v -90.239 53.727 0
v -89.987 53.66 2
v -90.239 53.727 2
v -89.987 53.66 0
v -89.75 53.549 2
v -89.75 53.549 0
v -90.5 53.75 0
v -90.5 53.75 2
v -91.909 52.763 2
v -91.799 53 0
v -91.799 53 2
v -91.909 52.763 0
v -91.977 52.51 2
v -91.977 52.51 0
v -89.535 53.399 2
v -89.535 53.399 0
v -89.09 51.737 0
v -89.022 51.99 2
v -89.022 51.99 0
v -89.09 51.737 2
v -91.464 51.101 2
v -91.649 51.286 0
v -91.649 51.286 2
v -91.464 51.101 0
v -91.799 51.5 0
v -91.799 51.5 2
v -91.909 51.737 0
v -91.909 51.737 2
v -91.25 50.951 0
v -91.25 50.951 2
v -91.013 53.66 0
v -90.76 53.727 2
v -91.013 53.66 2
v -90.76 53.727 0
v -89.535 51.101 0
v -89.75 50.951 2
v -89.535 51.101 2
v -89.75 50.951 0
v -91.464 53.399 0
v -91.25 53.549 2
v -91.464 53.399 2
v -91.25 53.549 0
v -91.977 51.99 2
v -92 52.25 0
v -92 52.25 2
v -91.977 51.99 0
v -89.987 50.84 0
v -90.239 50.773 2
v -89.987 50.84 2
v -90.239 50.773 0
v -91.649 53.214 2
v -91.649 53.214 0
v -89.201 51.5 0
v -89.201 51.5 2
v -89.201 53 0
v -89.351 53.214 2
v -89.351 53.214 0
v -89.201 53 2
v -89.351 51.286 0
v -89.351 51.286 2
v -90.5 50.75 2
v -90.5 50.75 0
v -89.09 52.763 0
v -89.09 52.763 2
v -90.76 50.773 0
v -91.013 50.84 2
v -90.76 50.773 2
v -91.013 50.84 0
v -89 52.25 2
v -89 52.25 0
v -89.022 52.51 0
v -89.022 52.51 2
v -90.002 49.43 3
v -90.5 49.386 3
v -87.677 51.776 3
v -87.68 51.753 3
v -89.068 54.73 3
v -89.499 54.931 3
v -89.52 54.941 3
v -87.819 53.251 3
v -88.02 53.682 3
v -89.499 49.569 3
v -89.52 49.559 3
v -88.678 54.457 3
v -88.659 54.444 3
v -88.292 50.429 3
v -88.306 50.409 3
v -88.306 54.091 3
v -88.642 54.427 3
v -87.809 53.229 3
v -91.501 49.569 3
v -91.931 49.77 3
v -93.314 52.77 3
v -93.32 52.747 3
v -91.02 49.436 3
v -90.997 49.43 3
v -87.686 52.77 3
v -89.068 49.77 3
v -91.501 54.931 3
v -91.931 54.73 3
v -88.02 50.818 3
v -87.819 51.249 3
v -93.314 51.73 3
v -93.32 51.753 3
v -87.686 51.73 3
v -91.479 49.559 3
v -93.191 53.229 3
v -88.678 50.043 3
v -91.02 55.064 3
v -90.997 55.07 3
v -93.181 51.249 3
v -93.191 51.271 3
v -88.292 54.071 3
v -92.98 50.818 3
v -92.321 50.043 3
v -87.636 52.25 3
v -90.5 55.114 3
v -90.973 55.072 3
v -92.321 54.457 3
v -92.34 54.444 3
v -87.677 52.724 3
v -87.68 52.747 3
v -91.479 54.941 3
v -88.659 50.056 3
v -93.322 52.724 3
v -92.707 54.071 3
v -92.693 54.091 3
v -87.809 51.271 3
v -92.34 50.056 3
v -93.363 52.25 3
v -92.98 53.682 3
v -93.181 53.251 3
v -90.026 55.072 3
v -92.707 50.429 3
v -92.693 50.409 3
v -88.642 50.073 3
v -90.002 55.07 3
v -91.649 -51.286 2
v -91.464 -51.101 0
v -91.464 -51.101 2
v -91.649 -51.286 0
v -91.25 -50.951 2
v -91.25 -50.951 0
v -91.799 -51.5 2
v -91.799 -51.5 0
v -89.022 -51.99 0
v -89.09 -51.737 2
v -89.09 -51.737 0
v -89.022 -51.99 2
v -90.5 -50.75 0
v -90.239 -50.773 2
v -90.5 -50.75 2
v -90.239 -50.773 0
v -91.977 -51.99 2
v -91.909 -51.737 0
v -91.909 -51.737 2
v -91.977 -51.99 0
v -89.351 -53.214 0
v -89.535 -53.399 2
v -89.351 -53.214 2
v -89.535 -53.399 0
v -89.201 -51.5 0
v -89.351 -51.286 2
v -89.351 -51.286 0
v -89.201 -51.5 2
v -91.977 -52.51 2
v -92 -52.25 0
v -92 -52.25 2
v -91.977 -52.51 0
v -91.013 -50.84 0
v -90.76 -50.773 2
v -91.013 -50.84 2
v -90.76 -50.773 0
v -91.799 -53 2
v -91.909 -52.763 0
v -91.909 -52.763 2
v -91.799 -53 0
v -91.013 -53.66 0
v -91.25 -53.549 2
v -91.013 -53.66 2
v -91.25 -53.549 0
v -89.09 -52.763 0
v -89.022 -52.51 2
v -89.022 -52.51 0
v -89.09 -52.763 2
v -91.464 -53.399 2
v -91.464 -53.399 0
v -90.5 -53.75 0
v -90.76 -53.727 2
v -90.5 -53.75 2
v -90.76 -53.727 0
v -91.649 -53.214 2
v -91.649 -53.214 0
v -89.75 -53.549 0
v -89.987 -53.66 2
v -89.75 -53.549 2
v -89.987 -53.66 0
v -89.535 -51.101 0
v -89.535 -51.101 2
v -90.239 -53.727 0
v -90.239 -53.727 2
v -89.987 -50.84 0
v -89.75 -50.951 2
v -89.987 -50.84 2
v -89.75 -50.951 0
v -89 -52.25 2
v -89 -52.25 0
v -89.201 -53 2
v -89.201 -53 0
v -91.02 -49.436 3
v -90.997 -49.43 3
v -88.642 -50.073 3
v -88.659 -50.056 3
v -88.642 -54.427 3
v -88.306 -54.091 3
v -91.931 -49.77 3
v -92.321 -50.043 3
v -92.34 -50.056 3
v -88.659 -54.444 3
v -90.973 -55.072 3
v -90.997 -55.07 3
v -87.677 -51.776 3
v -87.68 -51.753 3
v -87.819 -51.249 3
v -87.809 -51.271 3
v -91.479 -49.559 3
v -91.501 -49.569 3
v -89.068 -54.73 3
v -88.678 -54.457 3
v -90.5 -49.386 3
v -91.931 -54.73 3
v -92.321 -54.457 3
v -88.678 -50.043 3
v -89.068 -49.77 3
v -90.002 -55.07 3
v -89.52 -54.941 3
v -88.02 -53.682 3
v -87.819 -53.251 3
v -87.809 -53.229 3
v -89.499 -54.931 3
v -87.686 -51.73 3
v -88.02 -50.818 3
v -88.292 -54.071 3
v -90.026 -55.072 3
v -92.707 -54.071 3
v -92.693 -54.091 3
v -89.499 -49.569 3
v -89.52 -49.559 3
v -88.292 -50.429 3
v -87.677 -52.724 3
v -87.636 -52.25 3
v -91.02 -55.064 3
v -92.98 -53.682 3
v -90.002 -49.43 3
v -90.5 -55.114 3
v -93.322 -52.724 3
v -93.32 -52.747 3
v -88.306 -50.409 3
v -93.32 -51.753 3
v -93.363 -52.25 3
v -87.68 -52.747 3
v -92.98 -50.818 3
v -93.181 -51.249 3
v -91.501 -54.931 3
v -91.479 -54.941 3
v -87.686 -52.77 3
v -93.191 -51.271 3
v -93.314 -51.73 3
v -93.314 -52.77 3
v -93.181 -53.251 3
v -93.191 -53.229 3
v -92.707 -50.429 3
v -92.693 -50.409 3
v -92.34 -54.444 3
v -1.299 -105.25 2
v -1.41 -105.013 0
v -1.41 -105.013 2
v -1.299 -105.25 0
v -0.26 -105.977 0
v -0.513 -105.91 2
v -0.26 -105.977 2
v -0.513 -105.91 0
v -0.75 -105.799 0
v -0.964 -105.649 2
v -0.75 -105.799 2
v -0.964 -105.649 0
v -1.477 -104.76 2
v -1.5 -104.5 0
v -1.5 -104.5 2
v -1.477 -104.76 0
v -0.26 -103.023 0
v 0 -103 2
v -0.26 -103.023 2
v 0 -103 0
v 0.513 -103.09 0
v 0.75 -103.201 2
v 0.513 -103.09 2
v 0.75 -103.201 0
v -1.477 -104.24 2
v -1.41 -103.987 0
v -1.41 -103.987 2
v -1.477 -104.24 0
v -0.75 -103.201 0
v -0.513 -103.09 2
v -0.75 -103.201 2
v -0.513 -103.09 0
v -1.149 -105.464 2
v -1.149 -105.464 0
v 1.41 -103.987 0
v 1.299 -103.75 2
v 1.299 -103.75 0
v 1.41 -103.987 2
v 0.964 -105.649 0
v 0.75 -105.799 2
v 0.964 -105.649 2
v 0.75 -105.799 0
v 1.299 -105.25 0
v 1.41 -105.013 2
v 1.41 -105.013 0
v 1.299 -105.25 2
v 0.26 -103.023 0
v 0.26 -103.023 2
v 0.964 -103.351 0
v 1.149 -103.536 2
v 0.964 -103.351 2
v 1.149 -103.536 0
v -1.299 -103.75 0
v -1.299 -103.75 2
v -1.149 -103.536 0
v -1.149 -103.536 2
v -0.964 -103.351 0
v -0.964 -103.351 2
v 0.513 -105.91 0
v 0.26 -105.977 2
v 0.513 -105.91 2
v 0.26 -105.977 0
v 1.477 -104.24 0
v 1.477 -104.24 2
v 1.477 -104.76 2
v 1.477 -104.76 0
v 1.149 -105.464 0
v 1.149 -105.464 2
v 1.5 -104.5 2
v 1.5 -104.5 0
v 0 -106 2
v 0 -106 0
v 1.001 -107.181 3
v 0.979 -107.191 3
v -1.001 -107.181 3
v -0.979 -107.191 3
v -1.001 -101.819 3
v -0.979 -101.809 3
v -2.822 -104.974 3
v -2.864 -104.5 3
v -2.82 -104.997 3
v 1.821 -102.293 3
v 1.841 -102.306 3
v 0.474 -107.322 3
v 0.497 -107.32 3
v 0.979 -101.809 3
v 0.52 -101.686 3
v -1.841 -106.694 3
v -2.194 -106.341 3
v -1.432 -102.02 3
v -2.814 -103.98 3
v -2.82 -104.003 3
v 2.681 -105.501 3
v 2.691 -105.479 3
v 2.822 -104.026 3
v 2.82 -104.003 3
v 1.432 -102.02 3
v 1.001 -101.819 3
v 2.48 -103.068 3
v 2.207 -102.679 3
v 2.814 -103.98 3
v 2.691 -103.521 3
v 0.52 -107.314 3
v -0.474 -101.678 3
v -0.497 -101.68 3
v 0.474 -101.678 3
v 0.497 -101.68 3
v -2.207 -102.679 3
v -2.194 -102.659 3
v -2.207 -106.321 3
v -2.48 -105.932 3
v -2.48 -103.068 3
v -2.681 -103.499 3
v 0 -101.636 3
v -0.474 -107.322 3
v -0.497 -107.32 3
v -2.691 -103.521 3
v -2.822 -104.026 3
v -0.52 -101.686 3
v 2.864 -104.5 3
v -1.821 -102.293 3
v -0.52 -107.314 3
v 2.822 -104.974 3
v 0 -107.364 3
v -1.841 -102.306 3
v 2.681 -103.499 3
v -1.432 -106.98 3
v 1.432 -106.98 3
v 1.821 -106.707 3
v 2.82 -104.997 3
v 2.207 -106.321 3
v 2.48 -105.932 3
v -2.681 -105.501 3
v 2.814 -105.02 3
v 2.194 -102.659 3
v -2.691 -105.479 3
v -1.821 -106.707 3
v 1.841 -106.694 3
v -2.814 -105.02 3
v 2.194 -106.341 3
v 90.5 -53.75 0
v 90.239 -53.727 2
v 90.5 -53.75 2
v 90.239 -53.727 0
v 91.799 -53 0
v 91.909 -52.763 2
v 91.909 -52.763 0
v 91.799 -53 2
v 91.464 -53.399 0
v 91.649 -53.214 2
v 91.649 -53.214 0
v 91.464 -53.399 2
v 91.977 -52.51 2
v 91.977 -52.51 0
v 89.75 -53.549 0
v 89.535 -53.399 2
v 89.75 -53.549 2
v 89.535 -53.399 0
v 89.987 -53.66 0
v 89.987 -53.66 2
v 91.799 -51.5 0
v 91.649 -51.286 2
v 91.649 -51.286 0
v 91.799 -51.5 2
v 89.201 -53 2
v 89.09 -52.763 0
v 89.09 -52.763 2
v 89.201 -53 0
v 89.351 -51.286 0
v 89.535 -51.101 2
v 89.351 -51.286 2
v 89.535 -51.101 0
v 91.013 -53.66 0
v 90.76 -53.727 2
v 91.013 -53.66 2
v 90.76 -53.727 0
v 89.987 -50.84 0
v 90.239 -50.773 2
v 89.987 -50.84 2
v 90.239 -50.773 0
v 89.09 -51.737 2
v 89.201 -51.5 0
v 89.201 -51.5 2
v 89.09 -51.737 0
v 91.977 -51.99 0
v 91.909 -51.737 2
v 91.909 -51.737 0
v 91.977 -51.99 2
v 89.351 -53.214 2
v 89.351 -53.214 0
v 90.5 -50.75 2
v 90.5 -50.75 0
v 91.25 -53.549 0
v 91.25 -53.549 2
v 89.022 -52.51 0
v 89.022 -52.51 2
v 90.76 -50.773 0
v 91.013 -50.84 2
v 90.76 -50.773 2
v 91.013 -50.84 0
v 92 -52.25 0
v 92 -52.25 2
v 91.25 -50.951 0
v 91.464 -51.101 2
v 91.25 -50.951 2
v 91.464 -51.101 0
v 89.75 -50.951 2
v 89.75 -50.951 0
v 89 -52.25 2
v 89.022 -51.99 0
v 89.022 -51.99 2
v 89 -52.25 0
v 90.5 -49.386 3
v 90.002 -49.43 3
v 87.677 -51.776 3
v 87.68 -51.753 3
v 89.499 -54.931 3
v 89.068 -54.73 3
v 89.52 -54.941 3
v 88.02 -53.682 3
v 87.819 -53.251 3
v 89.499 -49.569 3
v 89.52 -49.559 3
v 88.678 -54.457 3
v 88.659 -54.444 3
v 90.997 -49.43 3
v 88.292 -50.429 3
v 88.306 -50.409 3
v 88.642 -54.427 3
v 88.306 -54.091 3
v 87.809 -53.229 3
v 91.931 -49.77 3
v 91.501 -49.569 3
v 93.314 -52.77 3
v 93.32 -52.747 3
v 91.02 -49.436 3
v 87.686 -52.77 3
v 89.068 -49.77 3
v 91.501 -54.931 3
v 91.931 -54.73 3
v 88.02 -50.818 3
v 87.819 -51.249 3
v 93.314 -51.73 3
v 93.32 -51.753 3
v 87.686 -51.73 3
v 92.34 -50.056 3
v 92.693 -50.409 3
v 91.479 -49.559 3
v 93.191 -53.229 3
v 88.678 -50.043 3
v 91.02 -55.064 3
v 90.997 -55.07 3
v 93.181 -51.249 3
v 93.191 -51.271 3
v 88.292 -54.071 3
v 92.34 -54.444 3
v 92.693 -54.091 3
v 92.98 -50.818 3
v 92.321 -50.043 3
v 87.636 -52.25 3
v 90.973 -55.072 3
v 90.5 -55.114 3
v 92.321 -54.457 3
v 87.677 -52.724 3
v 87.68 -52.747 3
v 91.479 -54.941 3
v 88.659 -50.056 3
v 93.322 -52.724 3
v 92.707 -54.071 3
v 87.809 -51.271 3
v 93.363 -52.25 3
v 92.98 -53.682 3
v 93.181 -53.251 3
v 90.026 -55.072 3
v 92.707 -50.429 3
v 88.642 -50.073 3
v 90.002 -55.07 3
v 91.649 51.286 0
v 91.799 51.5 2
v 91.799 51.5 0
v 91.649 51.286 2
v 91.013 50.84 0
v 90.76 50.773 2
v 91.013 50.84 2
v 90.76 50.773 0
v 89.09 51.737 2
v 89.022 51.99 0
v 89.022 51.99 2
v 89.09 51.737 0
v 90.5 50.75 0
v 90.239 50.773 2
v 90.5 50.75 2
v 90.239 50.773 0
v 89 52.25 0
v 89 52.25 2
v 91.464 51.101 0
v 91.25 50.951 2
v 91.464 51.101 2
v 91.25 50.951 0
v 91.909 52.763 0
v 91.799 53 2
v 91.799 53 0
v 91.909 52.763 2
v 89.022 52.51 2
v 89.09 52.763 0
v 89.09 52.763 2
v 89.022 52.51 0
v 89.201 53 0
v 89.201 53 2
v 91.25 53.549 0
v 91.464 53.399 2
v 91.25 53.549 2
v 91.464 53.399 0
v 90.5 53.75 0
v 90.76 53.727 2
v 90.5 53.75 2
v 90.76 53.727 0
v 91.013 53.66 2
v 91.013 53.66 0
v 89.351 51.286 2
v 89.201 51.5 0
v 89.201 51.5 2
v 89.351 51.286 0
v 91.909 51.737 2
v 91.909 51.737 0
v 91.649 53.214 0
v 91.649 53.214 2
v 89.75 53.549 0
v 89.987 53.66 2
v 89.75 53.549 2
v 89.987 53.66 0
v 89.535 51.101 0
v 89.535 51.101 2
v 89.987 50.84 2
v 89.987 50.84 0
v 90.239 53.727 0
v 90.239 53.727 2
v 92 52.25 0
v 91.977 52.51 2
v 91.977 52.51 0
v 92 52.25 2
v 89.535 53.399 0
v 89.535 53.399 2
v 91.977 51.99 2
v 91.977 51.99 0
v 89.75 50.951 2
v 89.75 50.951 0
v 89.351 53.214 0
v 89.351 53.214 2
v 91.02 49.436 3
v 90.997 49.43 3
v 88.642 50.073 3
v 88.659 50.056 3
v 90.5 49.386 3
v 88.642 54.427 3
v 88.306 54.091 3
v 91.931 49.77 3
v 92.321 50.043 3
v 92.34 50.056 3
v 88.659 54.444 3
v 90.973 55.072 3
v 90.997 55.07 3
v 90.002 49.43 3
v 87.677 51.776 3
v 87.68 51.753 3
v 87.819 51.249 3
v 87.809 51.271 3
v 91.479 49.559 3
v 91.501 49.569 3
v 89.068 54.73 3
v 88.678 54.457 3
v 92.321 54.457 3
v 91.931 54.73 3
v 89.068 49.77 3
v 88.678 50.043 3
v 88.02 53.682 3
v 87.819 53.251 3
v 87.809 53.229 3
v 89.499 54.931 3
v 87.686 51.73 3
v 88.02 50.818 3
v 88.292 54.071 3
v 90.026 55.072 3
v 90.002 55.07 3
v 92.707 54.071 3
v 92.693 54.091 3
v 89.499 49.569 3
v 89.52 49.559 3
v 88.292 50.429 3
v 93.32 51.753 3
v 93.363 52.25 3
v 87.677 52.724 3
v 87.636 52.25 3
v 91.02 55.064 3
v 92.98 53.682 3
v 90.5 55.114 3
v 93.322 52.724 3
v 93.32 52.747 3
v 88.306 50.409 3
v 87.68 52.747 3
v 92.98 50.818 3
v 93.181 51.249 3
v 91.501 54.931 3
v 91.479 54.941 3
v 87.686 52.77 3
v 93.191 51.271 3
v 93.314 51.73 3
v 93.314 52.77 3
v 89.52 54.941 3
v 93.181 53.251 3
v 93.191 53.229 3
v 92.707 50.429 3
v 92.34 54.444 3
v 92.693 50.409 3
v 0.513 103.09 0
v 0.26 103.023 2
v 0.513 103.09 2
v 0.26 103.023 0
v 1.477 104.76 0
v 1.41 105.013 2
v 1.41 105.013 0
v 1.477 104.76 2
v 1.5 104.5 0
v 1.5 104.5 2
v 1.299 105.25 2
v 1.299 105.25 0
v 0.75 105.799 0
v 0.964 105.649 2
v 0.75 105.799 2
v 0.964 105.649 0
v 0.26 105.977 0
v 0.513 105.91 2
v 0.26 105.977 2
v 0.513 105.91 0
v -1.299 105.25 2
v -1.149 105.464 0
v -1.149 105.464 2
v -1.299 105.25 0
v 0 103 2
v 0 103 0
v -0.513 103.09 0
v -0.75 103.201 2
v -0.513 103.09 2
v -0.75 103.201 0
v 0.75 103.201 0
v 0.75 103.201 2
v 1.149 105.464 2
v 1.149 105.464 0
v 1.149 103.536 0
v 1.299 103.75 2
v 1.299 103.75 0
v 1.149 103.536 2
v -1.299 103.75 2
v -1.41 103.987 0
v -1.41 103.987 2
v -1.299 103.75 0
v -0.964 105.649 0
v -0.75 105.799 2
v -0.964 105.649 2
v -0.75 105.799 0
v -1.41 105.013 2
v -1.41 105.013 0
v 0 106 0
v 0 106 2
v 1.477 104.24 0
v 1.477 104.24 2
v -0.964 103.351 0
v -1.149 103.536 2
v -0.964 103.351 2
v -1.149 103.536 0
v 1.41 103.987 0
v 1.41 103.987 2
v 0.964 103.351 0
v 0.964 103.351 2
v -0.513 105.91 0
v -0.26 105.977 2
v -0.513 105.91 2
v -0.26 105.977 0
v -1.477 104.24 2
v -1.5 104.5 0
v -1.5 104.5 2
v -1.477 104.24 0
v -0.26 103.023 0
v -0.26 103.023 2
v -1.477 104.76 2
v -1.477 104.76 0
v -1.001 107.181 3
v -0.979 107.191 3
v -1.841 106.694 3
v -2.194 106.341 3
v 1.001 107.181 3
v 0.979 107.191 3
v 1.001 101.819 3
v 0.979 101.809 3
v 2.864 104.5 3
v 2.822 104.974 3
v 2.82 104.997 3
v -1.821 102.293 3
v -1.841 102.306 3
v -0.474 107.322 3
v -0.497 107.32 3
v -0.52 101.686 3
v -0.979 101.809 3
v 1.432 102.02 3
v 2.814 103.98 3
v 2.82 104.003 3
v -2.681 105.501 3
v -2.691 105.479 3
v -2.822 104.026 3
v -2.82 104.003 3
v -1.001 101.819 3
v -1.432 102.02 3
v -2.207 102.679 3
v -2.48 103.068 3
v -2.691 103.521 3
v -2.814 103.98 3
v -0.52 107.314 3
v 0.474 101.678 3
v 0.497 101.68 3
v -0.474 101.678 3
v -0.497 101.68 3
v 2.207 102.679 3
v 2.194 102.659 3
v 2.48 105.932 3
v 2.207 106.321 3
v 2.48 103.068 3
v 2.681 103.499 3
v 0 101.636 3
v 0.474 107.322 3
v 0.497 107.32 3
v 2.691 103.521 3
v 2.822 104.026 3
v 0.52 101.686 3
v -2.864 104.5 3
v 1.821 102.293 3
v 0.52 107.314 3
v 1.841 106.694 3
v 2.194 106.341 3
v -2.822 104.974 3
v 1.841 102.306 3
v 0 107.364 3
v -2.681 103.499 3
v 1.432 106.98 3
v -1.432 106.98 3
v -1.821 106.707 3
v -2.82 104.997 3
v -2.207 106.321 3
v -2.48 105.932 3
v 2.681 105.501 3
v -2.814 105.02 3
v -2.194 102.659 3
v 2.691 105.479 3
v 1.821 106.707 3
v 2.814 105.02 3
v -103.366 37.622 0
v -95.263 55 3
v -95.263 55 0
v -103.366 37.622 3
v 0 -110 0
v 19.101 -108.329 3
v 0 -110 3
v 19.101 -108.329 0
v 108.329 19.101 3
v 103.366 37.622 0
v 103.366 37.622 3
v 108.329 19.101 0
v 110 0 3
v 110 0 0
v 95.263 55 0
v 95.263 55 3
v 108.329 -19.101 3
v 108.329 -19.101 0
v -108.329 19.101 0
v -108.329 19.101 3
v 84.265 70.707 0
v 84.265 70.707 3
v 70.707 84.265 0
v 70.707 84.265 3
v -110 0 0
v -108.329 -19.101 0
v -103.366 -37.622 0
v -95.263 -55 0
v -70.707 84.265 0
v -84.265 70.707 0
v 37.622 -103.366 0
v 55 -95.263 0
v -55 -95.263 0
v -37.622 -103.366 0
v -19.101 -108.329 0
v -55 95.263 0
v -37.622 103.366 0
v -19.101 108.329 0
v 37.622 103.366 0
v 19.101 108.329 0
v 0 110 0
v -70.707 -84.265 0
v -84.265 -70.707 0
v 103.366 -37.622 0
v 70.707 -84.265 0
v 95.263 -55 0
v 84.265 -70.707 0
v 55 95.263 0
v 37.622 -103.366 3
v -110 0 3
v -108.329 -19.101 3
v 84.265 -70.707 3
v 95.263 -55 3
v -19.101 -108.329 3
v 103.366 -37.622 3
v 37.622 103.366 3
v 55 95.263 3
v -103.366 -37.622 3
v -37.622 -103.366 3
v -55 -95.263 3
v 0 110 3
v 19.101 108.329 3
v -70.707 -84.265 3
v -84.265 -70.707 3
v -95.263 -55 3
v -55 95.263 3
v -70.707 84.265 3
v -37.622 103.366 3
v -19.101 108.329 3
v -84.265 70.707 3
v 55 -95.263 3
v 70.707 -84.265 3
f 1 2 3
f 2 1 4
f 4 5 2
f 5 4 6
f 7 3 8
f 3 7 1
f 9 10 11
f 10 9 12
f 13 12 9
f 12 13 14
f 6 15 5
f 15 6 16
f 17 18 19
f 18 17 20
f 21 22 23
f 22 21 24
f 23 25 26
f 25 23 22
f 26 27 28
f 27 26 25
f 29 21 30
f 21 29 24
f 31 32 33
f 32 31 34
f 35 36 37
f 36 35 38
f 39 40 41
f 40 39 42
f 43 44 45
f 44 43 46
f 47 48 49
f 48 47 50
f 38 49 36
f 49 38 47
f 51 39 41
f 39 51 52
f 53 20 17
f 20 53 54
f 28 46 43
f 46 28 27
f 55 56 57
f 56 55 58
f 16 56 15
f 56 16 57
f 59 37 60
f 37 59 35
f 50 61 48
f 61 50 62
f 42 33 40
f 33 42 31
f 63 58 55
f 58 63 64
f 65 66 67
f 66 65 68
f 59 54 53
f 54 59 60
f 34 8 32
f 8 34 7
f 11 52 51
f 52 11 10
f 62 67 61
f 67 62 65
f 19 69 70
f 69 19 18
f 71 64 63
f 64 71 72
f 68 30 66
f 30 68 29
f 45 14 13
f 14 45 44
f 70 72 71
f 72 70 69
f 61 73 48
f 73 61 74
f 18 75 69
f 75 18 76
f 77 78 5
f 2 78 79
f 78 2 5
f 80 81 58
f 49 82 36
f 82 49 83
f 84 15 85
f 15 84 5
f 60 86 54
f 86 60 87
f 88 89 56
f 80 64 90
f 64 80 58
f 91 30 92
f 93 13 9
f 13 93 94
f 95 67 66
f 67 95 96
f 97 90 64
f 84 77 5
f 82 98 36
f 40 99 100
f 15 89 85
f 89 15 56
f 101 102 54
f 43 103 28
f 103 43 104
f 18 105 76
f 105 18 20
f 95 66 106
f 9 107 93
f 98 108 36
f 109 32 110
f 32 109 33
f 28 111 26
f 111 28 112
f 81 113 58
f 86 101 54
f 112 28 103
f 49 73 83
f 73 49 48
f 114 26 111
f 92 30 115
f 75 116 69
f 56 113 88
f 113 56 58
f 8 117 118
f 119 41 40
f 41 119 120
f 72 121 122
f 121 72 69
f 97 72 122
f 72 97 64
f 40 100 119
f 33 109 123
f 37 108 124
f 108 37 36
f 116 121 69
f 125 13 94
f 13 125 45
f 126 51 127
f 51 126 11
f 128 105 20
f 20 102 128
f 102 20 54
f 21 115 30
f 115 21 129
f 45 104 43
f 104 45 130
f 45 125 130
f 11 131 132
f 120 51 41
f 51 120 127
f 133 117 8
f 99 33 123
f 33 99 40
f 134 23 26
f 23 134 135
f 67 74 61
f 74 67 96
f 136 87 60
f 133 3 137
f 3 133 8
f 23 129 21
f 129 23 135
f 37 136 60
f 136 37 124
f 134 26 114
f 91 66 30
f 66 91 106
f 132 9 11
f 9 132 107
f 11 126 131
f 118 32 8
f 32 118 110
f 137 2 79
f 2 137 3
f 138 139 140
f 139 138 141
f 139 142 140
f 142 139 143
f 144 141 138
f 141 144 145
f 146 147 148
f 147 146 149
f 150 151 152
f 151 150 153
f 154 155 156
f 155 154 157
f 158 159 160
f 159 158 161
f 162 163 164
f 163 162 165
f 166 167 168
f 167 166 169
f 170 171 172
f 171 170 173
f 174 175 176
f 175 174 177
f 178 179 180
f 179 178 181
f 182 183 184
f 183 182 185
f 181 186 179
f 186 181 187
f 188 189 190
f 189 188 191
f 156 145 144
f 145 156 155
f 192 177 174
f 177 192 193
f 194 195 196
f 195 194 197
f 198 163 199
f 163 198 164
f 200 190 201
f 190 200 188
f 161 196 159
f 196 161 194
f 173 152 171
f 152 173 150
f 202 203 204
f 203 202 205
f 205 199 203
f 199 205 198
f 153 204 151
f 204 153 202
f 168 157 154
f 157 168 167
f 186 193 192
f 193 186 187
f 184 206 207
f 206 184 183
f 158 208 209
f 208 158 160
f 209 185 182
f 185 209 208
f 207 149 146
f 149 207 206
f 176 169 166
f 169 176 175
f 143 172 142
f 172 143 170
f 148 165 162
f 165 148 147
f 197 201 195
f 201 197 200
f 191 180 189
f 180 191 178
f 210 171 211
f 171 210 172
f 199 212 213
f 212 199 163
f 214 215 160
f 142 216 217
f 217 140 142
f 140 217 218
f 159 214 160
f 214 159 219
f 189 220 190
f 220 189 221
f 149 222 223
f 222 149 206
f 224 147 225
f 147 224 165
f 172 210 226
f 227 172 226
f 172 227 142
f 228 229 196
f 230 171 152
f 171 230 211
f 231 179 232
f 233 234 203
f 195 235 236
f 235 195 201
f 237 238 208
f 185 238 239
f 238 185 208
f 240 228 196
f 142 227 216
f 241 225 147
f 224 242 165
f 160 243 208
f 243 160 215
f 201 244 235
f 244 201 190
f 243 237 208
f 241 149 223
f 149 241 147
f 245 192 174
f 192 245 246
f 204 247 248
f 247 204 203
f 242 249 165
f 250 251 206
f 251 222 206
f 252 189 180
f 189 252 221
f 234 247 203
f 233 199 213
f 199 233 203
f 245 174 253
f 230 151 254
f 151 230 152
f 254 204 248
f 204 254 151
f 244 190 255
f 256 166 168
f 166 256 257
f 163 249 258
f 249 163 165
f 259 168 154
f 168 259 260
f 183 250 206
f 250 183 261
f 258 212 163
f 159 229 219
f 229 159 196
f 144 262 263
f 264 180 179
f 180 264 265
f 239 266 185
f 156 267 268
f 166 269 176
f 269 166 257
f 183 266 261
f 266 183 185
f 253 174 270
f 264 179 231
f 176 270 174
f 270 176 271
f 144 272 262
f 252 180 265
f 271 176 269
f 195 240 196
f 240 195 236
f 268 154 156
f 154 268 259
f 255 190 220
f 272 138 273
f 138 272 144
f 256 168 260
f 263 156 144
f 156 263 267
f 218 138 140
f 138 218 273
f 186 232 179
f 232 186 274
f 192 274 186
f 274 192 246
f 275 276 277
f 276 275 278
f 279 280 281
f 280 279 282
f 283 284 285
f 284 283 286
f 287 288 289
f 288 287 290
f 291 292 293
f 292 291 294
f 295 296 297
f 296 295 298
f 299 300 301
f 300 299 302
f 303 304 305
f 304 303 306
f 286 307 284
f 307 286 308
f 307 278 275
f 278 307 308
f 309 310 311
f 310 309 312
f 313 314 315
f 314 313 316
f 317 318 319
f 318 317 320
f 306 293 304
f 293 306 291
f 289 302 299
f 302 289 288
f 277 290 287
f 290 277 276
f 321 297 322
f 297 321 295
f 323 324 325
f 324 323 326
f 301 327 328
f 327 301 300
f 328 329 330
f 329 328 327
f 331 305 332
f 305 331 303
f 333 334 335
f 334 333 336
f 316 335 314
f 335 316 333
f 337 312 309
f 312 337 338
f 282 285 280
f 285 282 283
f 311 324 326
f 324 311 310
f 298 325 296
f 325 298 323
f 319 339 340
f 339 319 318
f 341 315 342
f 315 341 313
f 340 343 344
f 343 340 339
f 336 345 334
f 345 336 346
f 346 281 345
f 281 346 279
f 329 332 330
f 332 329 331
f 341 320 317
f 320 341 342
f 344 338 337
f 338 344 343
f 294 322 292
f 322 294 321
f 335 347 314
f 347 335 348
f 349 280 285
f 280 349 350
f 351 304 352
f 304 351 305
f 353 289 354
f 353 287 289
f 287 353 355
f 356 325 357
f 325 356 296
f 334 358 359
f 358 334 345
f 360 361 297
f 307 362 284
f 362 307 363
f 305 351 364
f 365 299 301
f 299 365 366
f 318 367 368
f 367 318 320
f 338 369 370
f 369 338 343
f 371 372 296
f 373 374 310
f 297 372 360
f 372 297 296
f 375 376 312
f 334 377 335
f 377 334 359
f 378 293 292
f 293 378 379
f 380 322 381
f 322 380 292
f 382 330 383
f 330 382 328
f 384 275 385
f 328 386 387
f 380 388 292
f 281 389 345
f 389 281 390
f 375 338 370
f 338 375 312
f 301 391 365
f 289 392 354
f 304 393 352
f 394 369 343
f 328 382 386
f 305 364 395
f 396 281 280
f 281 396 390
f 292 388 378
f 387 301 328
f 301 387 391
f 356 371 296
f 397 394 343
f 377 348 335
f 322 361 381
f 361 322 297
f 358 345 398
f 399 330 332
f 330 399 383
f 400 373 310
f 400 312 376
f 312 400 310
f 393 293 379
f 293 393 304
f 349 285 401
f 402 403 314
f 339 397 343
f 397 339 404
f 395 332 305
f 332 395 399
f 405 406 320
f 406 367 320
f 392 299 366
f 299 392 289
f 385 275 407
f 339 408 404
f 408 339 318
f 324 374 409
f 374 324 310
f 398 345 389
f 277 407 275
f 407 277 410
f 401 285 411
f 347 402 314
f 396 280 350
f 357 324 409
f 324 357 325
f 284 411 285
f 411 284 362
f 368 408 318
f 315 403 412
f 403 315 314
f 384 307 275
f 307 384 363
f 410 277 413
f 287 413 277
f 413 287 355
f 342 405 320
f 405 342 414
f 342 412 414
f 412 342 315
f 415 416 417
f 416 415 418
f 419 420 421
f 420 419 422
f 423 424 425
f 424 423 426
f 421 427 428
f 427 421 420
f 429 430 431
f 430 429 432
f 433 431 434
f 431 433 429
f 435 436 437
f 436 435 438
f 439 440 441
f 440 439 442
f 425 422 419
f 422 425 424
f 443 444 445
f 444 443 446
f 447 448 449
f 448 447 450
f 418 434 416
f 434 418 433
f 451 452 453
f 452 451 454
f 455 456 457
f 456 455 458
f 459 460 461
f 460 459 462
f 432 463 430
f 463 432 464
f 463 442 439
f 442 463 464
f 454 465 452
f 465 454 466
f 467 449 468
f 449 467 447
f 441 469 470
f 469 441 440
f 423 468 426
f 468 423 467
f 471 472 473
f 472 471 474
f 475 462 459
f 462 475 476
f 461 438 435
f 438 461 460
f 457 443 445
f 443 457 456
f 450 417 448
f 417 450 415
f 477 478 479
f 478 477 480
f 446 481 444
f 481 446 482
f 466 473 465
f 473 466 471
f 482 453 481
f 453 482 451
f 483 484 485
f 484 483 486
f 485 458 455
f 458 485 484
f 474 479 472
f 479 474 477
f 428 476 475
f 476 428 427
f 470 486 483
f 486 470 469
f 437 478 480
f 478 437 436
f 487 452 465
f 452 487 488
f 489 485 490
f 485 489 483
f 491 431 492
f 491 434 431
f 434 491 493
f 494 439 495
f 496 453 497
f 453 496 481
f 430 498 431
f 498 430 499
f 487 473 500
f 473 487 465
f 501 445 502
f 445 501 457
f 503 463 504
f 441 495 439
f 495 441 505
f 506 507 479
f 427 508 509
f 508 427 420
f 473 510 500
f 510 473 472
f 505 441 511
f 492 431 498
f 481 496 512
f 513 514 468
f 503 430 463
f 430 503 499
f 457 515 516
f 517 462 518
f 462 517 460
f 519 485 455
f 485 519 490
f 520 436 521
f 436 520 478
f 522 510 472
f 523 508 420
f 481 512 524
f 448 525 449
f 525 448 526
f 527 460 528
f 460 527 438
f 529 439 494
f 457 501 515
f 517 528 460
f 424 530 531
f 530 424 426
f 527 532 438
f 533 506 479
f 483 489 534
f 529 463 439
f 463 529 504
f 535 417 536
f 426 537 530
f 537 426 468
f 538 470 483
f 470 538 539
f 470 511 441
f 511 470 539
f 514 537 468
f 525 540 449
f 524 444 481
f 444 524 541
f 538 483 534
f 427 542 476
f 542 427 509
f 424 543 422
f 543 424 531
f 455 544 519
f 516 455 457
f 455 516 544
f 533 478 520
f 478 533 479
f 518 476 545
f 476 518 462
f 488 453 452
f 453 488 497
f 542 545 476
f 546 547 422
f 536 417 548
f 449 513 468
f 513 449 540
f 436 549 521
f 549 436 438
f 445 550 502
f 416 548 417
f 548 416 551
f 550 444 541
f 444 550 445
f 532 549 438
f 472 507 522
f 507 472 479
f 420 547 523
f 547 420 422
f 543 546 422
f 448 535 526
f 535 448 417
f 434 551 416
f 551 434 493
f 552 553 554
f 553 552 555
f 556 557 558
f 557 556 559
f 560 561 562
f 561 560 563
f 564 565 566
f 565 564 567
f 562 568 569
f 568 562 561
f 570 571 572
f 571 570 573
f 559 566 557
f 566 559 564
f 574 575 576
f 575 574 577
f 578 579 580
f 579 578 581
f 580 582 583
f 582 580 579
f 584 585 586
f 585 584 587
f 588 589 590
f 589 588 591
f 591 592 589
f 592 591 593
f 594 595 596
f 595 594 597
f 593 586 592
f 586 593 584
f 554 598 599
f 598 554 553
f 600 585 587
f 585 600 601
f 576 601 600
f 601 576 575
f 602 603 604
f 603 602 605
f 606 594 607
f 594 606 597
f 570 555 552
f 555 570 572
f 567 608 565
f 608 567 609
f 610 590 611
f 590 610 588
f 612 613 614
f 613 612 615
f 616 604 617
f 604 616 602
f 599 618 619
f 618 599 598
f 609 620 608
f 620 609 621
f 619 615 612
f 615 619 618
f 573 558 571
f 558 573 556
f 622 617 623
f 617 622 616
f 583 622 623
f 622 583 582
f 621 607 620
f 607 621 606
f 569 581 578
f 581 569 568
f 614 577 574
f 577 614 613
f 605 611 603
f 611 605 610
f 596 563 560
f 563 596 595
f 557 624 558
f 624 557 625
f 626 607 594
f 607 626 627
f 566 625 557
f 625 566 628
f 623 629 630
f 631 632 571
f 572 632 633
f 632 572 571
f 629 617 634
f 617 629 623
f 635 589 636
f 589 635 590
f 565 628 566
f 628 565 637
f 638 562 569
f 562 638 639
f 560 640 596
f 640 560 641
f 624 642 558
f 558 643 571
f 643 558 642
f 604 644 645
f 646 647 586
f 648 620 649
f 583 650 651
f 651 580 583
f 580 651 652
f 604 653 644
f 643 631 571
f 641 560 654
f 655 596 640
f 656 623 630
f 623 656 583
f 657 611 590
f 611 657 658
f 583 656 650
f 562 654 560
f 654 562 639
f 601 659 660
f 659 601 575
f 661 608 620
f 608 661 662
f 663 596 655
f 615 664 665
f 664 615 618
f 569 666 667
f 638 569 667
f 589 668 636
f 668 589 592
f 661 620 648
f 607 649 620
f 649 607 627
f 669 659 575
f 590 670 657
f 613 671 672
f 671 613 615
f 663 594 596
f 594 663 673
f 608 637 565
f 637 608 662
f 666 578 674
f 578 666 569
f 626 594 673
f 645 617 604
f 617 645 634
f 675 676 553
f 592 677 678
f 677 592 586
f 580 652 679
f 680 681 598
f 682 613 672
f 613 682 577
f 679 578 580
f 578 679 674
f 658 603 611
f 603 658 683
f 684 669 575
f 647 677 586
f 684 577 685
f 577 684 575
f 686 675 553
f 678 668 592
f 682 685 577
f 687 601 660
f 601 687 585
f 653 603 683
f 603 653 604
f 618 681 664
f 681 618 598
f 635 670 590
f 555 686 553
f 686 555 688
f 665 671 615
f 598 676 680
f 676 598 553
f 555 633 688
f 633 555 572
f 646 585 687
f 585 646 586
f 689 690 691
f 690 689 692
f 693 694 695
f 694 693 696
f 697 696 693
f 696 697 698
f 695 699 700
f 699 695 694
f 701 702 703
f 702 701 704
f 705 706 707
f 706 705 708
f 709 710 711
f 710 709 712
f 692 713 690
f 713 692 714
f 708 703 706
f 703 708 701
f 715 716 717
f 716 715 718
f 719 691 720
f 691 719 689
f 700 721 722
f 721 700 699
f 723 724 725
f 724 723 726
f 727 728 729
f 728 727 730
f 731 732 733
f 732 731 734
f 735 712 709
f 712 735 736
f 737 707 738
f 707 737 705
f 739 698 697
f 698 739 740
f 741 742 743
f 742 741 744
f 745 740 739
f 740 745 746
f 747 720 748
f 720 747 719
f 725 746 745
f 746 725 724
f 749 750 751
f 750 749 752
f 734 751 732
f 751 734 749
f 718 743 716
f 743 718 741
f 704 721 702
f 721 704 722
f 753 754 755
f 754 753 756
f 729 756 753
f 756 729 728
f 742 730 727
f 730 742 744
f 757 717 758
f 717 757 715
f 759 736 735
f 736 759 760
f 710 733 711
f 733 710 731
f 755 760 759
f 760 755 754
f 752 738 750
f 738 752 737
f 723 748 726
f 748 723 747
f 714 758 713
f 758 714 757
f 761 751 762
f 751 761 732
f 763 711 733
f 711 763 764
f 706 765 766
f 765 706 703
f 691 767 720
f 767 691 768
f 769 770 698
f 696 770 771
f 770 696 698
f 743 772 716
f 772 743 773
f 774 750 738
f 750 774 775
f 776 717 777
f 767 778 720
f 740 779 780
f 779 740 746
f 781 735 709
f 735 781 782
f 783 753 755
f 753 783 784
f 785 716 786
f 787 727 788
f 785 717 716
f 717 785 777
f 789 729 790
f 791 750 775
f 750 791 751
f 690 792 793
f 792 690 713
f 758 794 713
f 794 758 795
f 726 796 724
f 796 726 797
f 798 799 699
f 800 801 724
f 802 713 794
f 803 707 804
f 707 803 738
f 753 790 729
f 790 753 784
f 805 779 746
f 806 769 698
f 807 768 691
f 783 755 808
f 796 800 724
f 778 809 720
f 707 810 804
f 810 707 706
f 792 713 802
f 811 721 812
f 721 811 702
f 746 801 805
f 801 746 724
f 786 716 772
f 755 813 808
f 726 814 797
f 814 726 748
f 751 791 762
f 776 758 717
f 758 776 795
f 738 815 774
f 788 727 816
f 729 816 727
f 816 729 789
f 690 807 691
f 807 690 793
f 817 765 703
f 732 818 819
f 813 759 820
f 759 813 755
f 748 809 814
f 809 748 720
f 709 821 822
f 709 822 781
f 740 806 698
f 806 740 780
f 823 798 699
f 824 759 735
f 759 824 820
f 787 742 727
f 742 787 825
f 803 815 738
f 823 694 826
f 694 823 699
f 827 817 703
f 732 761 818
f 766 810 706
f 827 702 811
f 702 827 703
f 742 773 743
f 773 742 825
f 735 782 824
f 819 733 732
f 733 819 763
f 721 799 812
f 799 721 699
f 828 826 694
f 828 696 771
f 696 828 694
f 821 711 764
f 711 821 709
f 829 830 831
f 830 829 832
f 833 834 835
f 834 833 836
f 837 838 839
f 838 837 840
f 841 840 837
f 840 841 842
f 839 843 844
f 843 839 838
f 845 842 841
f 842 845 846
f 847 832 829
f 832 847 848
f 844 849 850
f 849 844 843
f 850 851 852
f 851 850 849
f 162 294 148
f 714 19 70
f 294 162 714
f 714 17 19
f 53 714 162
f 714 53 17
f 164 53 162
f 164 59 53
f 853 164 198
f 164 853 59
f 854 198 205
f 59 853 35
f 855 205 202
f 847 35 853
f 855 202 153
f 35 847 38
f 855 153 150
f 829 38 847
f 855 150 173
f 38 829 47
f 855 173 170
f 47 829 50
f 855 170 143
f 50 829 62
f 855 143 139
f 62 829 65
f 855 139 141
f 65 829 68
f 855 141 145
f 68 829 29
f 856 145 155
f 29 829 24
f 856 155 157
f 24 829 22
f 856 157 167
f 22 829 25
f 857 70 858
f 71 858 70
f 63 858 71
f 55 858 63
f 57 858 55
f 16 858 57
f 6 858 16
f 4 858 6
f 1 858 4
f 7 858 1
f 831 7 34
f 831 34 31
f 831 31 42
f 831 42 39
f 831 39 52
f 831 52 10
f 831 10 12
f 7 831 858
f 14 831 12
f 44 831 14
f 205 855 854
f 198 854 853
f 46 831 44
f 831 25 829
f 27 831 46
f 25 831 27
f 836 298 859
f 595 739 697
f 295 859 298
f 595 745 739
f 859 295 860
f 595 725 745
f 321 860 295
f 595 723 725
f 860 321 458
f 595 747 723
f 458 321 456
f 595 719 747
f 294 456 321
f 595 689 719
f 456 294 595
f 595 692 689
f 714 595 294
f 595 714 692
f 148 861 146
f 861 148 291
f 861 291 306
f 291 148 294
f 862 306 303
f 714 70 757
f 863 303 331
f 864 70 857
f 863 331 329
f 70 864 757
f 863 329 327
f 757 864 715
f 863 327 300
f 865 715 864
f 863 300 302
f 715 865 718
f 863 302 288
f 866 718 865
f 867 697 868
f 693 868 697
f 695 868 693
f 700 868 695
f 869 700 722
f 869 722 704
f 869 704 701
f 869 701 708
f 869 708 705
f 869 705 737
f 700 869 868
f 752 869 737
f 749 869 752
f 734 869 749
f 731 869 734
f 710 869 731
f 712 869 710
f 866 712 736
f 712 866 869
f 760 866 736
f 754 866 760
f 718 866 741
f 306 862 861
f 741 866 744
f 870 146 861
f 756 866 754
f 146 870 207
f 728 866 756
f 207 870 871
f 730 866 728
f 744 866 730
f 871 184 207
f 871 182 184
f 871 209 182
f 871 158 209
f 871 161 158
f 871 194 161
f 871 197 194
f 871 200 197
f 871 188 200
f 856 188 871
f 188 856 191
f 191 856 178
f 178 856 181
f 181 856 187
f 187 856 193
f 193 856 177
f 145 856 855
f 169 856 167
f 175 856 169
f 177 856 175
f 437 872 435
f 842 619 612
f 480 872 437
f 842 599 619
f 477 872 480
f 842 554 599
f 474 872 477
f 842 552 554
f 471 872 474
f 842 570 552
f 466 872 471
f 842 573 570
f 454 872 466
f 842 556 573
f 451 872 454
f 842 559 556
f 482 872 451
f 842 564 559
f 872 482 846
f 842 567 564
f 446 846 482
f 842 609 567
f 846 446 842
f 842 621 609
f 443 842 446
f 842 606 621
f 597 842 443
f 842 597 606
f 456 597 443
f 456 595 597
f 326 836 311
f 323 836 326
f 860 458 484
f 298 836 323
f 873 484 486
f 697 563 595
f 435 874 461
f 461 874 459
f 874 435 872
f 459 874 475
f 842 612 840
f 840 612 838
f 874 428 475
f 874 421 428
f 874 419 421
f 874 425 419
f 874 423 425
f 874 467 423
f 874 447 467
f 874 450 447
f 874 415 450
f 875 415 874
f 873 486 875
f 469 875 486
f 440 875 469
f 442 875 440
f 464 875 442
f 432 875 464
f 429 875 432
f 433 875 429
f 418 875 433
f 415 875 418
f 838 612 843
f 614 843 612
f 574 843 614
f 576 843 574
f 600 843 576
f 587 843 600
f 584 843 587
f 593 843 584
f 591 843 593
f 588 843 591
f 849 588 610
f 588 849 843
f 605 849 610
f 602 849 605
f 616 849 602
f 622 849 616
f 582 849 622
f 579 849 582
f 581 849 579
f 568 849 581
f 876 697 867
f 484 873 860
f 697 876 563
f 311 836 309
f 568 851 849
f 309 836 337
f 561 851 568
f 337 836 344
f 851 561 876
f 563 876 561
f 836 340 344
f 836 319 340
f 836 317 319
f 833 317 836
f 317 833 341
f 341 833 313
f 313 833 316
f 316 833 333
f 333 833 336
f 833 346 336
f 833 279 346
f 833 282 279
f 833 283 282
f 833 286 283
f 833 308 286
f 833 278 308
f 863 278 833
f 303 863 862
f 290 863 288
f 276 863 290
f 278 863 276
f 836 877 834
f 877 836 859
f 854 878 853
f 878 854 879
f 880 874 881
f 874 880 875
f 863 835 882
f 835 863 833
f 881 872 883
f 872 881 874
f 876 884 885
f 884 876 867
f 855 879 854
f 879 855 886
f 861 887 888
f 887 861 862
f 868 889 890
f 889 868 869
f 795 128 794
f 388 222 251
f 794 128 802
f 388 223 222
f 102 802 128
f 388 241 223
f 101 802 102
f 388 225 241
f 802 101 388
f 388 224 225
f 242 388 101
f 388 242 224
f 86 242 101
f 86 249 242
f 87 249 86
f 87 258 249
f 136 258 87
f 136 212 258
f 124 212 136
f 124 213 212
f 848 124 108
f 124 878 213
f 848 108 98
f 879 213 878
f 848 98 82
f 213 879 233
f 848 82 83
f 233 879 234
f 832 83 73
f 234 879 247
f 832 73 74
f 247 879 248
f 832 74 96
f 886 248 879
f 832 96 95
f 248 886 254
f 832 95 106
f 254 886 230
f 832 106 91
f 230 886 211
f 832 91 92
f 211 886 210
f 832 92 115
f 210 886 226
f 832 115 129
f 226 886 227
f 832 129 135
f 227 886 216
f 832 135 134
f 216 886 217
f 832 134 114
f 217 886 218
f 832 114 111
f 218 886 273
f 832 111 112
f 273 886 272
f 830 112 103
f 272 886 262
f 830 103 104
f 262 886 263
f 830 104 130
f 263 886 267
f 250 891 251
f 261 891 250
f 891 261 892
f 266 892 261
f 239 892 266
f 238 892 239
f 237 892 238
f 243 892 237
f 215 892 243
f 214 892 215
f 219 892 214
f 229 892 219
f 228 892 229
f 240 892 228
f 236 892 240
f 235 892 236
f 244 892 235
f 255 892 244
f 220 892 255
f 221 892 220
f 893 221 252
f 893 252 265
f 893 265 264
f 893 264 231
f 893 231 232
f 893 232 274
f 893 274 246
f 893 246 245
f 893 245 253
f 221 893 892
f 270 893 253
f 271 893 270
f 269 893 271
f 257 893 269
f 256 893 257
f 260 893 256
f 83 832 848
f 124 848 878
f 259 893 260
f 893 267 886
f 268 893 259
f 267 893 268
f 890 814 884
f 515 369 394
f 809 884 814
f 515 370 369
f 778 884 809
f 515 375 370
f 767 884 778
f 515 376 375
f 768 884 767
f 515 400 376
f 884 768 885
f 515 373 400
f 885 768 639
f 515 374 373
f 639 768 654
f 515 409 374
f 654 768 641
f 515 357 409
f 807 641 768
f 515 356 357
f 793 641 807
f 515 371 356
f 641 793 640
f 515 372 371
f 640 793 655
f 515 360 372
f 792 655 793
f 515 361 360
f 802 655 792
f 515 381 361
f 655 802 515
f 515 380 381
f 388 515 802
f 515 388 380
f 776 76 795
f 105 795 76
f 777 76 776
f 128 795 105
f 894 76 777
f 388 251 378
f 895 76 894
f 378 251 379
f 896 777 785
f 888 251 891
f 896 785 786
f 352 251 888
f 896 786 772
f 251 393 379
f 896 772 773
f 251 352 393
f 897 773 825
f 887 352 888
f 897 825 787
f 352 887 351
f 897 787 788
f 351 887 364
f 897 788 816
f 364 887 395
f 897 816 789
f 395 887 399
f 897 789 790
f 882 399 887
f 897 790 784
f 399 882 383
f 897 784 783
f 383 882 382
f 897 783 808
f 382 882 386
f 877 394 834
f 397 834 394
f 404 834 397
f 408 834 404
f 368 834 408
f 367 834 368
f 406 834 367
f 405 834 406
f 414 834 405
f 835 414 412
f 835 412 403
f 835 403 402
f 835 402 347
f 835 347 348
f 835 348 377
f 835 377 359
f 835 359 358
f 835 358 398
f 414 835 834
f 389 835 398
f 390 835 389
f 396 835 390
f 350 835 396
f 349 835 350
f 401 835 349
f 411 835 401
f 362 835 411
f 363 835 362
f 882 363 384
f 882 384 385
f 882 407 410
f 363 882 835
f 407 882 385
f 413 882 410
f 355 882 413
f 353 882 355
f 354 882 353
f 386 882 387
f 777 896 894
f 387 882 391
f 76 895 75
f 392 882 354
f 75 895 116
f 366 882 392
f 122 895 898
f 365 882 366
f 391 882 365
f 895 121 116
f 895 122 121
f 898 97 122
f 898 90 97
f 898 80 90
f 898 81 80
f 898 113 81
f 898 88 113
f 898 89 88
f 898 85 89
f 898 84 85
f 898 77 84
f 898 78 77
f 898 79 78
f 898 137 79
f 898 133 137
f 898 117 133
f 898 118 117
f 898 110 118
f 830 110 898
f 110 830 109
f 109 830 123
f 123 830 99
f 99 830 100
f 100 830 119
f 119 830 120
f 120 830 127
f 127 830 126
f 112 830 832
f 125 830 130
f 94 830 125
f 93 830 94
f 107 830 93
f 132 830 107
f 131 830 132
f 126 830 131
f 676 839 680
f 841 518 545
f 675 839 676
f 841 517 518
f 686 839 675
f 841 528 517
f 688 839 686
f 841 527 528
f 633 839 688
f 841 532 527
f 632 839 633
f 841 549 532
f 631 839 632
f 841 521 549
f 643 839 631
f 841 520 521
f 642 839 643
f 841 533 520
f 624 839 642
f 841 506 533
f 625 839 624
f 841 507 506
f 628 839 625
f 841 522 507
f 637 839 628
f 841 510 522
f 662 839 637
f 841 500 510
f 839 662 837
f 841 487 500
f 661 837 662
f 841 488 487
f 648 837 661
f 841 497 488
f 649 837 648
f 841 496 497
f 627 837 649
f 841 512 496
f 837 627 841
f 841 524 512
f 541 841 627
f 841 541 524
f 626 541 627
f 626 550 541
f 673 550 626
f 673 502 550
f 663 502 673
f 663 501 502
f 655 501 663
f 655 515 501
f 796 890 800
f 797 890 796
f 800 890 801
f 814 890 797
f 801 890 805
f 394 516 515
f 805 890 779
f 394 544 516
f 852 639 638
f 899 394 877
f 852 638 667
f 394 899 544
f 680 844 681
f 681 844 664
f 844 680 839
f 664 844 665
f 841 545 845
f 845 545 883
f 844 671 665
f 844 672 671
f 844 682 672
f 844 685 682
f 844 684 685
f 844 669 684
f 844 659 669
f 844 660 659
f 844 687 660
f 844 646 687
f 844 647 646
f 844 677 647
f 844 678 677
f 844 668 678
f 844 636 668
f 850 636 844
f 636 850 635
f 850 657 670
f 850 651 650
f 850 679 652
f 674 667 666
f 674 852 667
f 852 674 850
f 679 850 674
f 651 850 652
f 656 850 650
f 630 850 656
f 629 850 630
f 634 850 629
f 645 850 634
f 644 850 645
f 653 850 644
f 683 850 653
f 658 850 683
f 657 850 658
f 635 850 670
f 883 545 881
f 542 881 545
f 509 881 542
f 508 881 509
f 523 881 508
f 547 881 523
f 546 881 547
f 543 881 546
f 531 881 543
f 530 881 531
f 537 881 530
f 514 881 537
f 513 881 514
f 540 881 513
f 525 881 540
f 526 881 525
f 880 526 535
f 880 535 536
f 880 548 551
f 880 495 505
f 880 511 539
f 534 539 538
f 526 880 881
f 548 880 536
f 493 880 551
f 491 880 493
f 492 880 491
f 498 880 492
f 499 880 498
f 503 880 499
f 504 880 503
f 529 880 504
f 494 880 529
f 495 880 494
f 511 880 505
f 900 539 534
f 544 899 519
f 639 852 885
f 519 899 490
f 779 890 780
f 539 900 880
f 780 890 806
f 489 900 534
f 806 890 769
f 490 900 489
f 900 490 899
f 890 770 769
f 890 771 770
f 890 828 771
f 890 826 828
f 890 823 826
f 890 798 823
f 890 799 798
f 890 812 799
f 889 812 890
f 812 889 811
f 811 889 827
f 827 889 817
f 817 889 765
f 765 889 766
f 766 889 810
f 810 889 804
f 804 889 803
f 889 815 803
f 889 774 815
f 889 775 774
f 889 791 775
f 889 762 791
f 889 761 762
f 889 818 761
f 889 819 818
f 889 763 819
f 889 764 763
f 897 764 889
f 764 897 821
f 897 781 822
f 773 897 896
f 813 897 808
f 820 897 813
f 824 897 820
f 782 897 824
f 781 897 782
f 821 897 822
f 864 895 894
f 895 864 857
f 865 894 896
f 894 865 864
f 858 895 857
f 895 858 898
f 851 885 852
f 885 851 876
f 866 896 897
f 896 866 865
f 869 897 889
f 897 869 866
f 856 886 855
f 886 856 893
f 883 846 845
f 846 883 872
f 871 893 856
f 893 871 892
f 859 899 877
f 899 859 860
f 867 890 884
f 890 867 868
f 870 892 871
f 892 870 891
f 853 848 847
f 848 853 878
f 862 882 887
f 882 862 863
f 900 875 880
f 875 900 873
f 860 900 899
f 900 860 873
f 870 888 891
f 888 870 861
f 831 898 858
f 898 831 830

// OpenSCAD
/*
Heatbed MK3Y
*/

$fn = 36;

heatbed();
module heatbed()
{
    
                difference() 
    {
    aluminum = [0.92, 0.92, 0.92];
    color(aluminum,1)
    cylinder(h=3, d=220, center=false);
    
          for(i=[1:6])
      {
    rotate(a = [0, 0, (60*i)])
    translate([0,104.5,-1])
          
    cylinder(h=5, d=3, center=false);
          
              rotate(a = [0, 0, (60*i)])
    translate([0,104.5,2])
        cylinder(h=1.1, d=3, d2=6, center=false);      
      }
    }
}
